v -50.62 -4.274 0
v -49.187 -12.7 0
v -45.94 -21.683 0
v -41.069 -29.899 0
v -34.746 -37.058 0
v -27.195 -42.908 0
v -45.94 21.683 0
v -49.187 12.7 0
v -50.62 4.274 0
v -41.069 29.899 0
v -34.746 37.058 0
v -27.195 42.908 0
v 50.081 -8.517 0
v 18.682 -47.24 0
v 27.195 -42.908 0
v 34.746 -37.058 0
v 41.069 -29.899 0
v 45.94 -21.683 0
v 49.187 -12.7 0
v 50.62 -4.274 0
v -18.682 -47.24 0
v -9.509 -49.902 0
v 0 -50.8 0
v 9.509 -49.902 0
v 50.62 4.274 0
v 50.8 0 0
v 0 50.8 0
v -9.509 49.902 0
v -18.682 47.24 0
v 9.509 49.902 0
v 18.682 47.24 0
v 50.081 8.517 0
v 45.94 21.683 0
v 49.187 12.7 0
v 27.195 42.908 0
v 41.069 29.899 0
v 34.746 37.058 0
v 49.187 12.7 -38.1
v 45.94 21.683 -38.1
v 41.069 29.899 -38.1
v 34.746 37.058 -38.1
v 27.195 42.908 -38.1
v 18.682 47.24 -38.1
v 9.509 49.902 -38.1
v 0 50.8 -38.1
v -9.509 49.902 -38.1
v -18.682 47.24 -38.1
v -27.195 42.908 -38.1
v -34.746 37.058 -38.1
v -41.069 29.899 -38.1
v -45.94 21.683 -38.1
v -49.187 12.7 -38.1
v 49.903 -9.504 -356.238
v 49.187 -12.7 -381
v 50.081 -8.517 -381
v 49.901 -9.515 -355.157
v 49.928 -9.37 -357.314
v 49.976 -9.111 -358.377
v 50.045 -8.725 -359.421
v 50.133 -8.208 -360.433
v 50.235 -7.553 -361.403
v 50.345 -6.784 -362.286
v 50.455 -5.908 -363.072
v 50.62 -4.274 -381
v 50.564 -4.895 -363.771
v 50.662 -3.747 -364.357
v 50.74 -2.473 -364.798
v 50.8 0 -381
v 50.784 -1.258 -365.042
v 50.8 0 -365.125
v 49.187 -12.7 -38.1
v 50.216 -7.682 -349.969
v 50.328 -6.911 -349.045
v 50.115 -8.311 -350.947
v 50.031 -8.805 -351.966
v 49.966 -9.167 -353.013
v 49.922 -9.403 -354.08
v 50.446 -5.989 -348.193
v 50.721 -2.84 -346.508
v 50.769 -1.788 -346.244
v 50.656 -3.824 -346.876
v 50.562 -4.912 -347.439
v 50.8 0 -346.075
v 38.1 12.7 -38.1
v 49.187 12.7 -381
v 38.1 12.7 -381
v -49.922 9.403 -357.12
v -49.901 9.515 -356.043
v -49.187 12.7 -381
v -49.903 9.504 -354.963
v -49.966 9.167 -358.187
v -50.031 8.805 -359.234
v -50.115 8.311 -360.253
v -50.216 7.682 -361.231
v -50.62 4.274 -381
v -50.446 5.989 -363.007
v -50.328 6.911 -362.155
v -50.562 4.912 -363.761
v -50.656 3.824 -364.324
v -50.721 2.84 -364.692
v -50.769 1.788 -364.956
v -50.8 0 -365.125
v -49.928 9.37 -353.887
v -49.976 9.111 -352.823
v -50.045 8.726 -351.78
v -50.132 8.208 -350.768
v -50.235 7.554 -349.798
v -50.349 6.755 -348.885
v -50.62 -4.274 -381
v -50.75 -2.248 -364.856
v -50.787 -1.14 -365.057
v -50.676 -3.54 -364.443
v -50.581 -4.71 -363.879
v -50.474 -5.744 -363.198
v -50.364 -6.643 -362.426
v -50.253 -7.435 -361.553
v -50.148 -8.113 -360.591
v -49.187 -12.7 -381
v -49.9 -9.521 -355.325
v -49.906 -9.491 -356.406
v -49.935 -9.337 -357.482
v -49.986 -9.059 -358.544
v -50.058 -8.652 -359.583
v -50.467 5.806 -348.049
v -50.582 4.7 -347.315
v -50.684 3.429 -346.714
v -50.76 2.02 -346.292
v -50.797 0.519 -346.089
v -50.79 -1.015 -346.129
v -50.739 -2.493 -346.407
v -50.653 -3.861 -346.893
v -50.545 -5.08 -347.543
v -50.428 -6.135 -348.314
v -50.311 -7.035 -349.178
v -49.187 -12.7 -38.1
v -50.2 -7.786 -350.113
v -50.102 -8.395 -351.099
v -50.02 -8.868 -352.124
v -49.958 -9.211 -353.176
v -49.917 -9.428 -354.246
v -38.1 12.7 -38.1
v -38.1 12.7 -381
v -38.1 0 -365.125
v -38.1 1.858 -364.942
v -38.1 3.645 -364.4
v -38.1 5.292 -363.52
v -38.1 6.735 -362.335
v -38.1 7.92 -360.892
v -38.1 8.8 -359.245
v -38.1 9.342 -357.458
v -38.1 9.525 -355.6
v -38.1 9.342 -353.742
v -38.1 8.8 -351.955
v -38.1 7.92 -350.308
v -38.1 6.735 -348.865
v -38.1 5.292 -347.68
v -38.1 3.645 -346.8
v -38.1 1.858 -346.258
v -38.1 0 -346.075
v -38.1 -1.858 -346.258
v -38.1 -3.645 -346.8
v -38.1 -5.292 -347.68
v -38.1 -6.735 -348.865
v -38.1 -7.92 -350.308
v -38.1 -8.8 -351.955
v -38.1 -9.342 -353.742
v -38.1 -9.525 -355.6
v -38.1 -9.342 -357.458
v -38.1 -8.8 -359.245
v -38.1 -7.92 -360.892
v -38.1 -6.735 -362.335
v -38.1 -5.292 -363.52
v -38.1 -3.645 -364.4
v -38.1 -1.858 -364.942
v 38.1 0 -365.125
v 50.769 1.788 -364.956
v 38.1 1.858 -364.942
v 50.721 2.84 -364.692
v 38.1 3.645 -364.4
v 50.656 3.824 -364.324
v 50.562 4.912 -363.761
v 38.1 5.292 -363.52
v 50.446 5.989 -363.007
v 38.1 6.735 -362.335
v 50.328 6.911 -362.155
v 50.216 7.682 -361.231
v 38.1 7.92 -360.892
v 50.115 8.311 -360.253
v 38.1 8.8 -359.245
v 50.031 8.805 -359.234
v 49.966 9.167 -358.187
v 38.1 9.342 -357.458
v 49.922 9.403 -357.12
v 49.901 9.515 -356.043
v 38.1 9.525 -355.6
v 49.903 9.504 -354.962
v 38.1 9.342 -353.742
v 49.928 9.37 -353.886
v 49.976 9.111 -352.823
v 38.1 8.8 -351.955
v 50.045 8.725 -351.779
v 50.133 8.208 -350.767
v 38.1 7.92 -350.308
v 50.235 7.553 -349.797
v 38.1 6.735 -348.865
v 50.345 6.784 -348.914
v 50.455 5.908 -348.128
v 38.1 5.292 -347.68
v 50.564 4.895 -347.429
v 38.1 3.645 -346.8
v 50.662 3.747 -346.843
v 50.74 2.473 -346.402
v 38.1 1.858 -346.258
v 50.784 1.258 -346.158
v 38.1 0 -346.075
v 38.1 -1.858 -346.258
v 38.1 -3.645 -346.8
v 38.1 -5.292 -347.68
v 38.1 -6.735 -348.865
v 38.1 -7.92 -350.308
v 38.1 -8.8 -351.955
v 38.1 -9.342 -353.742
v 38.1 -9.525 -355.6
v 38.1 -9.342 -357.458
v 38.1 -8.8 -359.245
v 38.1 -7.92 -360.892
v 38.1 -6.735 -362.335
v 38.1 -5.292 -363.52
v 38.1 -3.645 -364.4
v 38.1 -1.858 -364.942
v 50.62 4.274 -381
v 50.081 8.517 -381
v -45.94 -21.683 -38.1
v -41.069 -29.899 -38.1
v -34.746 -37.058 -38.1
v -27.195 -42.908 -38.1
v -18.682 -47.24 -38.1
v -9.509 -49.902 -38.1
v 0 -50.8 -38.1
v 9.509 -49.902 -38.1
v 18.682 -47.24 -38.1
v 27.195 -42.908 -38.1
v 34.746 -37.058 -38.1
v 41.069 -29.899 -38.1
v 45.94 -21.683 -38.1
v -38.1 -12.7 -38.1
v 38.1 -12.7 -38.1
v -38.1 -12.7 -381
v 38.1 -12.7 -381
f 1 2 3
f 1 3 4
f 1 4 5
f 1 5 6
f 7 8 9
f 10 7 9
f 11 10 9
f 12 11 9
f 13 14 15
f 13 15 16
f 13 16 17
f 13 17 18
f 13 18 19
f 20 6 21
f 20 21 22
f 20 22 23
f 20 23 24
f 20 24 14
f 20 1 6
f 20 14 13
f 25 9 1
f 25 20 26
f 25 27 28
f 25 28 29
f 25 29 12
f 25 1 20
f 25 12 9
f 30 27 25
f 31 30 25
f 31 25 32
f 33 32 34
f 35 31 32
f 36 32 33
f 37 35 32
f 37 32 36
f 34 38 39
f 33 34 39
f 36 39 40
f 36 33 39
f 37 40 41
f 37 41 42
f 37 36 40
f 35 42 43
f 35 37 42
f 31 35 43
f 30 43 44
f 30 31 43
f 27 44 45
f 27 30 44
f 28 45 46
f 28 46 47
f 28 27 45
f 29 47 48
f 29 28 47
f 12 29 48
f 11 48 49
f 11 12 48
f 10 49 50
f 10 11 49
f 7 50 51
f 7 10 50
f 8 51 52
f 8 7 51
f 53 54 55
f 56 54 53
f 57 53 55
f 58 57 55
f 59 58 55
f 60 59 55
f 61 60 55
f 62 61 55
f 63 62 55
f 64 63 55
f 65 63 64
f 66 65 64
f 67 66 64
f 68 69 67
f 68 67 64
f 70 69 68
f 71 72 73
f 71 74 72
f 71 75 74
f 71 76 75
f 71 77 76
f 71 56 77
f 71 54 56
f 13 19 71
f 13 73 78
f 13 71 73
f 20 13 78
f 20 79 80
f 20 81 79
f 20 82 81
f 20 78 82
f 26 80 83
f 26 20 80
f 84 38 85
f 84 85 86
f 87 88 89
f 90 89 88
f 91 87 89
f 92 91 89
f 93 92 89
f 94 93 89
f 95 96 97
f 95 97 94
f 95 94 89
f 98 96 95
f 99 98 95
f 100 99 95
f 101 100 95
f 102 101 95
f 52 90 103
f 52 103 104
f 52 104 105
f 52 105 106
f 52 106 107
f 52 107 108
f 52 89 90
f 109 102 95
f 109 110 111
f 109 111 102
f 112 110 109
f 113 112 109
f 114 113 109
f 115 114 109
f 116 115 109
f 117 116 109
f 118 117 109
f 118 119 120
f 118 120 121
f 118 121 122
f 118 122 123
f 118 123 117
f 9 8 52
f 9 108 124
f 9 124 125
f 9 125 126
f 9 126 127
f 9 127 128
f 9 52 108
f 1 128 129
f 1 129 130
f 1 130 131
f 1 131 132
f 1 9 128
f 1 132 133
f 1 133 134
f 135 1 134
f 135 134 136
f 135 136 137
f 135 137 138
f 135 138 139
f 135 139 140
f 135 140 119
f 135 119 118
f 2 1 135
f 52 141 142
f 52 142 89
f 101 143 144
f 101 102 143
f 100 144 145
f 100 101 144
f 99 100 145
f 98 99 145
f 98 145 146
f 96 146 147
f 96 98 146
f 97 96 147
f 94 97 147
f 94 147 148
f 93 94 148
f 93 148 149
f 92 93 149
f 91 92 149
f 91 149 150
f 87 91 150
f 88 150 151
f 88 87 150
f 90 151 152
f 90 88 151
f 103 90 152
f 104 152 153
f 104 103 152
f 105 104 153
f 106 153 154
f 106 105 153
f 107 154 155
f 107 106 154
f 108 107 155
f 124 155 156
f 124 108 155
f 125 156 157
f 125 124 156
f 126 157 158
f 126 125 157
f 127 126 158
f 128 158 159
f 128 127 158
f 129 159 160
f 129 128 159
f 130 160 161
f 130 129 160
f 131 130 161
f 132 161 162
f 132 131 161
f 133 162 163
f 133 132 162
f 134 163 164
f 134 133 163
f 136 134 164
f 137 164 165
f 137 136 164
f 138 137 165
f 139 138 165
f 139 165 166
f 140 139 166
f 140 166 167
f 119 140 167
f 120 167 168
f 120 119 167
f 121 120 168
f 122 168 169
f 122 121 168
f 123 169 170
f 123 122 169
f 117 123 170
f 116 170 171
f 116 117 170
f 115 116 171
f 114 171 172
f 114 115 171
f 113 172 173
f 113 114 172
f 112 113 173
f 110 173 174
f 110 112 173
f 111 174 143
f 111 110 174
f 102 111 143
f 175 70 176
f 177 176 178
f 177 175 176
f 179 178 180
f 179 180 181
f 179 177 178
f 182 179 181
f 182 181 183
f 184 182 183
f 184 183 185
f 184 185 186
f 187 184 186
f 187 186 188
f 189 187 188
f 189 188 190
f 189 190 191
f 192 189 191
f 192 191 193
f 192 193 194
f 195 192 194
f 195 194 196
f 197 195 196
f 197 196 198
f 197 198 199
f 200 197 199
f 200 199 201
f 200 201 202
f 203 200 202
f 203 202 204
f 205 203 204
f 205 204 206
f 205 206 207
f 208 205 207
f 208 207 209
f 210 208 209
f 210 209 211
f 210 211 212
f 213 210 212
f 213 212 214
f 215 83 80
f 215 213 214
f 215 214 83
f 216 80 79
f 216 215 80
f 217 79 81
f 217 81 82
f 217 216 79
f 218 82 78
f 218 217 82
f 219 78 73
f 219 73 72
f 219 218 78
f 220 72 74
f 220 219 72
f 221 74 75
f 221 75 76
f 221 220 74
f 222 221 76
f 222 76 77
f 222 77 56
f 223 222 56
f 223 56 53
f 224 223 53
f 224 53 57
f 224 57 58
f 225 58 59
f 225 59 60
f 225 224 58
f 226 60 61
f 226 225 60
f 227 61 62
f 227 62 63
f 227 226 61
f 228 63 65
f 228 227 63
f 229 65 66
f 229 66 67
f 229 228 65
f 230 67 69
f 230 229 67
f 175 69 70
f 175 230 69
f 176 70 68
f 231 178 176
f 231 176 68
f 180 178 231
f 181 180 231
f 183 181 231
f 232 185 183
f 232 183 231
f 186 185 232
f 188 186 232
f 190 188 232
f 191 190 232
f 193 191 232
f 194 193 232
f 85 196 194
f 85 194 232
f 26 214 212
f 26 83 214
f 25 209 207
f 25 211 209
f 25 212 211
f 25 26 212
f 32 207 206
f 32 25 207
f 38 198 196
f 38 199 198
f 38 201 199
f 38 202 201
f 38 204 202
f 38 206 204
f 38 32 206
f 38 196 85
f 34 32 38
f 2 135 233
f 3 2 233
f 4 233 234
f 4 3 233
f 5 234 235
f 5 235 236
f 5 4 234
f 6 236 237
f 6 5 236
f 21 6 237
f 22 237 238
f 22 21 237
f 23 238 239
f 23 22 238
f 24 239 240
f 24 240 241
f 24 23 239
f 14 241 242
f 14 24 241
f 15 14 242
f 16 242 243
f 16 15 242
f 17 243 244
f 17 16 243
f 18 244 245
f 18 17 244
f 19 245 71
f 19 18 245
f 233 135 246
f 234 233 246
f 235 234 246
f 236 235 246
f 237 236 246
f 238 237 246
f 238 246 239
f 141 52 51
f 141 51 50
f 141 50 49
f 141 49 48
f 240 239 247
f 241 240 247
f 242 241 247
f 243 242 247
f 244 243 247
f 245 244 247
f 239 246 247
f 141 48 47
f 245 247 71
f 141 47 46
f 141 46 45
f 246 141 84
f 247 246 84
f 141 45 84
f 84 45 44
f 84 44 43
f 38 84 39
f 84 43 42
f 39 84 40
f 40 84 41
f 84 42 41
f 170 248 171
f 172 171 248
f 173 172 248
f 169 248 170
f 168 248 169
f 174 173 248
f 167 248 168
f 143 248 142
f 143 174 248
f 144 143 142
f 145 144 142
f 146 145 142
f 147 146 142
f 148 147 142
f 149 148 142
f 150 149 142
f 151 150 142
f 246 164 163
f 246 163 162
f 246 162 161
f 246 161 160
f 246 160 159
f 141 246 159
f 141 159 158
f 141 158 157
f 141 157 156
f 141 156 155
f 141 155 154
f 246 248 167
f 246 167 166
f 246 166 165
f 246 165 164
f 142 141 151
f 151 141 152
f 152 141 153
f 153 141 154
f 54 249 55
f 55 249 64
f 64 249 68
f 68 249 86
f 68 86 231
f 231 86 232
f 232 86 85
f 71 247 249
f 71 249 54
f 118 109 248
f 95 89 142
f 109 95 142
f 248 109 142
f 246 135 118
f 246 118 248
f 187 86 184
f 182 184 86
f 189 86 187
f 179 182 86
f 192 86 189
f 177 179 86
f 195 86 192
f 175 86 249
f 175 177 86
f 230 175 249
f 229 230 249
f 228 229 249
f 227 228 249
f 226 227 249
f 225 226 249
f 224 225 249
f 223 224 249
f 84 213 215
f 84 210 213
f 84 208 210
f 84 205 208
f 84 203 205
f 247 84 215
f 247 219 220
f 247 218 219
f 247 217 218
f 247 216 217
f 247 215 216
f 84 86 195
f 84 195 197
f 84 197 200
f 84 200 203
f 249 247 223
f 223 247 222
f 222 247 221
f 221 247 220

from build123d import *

# Parameters (mm, degrees)
BOSS_EXTRUDE1_DEPTH     = 38.1
BOSS_EXTRUDE2_DEPTH     = 381
CUT_EXTRUDE1_DEPTH      = 395.518504002
CUT_EXTRUDE1_DEPTH_BACK = 395.518504002
SKETCH2_R               = 9.525


with BuildPart() as part:
    # Sketch1 → Boss-Extrude1 (new body)
    with BuildSketch(Plane.XY):
        with BuildLine():
            Line((38.1, 12.7), (49.186888497, 12.7))
            ThreePointArc((49.186888497, 12.7), (0, 50.8), (-49.186888497, 12.7))
            Line((-49.186888497, 12.7), (-38.1, 12.7))
            Line((-38.1, 12.7), (-38.1, -12.7))
            Line((-38.1, -12.7), (-49.186888497, -12.7))
            ThreePointArc((-49.186888497, -12.7), (0, -50.8), (49.186888497, -12.7))
            Line((49.186888497, -12.7), (38.1, -12.7))
            Line((38.1, -12.7), (38.1, 12.7))
        make_face()
    extrude(amount=-BOSS_EXTRUDE1_DEPTH)

    # Sketch1<3> → Boss-Extrude2 (add)
    with BuildSketch(Plane.XY):
        with BuildLine():
            ThreePointArc((49.186888497, -12.7), (50.8, 0), (49.186888497, 12.7))
            Line((49.186888497, 12.7), (38.1, 12.7))
            Line((38.1, 12.7), (38.1, -12.7))
            Line((38.1, -12.7), (49.186888497, -12.7))
        make_face()
        with BuildLine():
            Line((-38.1, 12.7), (-49.186888497, 12.7))
            ThreePointArc((-49.186888497, 12.7), (-50.8, 0), (-49.186888497, -12.7))
            Line((-49.186888497, -12.7), (-38.1, -12.7))
            Line((-38.1, -12.7), (-38.1, 12.7))
        make_face()
    extrude(amount=-BOSS_EXTRUDE2_DEPTH)

    # Sketch2 → Cut-Extrude1 (cut, two sides: drawn at the far end of the back side and taken through both)
    with BuildSketch(Plane(origin=(-38.1, 0, 0), x_dir=(0, 0, -1), z_dir=(1, 0, 0)).offset(-CUT_EXTRUDE1_DEPTH_BACK)):
        with Locations((355.6, 0)):
            Circle(SKETCH2_R)
    extrude(amount=CUT_EXTRUDE1_DEPTH + CUT_EXTRUDE1_DEPTH_BACK, mode=Mode.SUBTRACT)


solid = part.part
